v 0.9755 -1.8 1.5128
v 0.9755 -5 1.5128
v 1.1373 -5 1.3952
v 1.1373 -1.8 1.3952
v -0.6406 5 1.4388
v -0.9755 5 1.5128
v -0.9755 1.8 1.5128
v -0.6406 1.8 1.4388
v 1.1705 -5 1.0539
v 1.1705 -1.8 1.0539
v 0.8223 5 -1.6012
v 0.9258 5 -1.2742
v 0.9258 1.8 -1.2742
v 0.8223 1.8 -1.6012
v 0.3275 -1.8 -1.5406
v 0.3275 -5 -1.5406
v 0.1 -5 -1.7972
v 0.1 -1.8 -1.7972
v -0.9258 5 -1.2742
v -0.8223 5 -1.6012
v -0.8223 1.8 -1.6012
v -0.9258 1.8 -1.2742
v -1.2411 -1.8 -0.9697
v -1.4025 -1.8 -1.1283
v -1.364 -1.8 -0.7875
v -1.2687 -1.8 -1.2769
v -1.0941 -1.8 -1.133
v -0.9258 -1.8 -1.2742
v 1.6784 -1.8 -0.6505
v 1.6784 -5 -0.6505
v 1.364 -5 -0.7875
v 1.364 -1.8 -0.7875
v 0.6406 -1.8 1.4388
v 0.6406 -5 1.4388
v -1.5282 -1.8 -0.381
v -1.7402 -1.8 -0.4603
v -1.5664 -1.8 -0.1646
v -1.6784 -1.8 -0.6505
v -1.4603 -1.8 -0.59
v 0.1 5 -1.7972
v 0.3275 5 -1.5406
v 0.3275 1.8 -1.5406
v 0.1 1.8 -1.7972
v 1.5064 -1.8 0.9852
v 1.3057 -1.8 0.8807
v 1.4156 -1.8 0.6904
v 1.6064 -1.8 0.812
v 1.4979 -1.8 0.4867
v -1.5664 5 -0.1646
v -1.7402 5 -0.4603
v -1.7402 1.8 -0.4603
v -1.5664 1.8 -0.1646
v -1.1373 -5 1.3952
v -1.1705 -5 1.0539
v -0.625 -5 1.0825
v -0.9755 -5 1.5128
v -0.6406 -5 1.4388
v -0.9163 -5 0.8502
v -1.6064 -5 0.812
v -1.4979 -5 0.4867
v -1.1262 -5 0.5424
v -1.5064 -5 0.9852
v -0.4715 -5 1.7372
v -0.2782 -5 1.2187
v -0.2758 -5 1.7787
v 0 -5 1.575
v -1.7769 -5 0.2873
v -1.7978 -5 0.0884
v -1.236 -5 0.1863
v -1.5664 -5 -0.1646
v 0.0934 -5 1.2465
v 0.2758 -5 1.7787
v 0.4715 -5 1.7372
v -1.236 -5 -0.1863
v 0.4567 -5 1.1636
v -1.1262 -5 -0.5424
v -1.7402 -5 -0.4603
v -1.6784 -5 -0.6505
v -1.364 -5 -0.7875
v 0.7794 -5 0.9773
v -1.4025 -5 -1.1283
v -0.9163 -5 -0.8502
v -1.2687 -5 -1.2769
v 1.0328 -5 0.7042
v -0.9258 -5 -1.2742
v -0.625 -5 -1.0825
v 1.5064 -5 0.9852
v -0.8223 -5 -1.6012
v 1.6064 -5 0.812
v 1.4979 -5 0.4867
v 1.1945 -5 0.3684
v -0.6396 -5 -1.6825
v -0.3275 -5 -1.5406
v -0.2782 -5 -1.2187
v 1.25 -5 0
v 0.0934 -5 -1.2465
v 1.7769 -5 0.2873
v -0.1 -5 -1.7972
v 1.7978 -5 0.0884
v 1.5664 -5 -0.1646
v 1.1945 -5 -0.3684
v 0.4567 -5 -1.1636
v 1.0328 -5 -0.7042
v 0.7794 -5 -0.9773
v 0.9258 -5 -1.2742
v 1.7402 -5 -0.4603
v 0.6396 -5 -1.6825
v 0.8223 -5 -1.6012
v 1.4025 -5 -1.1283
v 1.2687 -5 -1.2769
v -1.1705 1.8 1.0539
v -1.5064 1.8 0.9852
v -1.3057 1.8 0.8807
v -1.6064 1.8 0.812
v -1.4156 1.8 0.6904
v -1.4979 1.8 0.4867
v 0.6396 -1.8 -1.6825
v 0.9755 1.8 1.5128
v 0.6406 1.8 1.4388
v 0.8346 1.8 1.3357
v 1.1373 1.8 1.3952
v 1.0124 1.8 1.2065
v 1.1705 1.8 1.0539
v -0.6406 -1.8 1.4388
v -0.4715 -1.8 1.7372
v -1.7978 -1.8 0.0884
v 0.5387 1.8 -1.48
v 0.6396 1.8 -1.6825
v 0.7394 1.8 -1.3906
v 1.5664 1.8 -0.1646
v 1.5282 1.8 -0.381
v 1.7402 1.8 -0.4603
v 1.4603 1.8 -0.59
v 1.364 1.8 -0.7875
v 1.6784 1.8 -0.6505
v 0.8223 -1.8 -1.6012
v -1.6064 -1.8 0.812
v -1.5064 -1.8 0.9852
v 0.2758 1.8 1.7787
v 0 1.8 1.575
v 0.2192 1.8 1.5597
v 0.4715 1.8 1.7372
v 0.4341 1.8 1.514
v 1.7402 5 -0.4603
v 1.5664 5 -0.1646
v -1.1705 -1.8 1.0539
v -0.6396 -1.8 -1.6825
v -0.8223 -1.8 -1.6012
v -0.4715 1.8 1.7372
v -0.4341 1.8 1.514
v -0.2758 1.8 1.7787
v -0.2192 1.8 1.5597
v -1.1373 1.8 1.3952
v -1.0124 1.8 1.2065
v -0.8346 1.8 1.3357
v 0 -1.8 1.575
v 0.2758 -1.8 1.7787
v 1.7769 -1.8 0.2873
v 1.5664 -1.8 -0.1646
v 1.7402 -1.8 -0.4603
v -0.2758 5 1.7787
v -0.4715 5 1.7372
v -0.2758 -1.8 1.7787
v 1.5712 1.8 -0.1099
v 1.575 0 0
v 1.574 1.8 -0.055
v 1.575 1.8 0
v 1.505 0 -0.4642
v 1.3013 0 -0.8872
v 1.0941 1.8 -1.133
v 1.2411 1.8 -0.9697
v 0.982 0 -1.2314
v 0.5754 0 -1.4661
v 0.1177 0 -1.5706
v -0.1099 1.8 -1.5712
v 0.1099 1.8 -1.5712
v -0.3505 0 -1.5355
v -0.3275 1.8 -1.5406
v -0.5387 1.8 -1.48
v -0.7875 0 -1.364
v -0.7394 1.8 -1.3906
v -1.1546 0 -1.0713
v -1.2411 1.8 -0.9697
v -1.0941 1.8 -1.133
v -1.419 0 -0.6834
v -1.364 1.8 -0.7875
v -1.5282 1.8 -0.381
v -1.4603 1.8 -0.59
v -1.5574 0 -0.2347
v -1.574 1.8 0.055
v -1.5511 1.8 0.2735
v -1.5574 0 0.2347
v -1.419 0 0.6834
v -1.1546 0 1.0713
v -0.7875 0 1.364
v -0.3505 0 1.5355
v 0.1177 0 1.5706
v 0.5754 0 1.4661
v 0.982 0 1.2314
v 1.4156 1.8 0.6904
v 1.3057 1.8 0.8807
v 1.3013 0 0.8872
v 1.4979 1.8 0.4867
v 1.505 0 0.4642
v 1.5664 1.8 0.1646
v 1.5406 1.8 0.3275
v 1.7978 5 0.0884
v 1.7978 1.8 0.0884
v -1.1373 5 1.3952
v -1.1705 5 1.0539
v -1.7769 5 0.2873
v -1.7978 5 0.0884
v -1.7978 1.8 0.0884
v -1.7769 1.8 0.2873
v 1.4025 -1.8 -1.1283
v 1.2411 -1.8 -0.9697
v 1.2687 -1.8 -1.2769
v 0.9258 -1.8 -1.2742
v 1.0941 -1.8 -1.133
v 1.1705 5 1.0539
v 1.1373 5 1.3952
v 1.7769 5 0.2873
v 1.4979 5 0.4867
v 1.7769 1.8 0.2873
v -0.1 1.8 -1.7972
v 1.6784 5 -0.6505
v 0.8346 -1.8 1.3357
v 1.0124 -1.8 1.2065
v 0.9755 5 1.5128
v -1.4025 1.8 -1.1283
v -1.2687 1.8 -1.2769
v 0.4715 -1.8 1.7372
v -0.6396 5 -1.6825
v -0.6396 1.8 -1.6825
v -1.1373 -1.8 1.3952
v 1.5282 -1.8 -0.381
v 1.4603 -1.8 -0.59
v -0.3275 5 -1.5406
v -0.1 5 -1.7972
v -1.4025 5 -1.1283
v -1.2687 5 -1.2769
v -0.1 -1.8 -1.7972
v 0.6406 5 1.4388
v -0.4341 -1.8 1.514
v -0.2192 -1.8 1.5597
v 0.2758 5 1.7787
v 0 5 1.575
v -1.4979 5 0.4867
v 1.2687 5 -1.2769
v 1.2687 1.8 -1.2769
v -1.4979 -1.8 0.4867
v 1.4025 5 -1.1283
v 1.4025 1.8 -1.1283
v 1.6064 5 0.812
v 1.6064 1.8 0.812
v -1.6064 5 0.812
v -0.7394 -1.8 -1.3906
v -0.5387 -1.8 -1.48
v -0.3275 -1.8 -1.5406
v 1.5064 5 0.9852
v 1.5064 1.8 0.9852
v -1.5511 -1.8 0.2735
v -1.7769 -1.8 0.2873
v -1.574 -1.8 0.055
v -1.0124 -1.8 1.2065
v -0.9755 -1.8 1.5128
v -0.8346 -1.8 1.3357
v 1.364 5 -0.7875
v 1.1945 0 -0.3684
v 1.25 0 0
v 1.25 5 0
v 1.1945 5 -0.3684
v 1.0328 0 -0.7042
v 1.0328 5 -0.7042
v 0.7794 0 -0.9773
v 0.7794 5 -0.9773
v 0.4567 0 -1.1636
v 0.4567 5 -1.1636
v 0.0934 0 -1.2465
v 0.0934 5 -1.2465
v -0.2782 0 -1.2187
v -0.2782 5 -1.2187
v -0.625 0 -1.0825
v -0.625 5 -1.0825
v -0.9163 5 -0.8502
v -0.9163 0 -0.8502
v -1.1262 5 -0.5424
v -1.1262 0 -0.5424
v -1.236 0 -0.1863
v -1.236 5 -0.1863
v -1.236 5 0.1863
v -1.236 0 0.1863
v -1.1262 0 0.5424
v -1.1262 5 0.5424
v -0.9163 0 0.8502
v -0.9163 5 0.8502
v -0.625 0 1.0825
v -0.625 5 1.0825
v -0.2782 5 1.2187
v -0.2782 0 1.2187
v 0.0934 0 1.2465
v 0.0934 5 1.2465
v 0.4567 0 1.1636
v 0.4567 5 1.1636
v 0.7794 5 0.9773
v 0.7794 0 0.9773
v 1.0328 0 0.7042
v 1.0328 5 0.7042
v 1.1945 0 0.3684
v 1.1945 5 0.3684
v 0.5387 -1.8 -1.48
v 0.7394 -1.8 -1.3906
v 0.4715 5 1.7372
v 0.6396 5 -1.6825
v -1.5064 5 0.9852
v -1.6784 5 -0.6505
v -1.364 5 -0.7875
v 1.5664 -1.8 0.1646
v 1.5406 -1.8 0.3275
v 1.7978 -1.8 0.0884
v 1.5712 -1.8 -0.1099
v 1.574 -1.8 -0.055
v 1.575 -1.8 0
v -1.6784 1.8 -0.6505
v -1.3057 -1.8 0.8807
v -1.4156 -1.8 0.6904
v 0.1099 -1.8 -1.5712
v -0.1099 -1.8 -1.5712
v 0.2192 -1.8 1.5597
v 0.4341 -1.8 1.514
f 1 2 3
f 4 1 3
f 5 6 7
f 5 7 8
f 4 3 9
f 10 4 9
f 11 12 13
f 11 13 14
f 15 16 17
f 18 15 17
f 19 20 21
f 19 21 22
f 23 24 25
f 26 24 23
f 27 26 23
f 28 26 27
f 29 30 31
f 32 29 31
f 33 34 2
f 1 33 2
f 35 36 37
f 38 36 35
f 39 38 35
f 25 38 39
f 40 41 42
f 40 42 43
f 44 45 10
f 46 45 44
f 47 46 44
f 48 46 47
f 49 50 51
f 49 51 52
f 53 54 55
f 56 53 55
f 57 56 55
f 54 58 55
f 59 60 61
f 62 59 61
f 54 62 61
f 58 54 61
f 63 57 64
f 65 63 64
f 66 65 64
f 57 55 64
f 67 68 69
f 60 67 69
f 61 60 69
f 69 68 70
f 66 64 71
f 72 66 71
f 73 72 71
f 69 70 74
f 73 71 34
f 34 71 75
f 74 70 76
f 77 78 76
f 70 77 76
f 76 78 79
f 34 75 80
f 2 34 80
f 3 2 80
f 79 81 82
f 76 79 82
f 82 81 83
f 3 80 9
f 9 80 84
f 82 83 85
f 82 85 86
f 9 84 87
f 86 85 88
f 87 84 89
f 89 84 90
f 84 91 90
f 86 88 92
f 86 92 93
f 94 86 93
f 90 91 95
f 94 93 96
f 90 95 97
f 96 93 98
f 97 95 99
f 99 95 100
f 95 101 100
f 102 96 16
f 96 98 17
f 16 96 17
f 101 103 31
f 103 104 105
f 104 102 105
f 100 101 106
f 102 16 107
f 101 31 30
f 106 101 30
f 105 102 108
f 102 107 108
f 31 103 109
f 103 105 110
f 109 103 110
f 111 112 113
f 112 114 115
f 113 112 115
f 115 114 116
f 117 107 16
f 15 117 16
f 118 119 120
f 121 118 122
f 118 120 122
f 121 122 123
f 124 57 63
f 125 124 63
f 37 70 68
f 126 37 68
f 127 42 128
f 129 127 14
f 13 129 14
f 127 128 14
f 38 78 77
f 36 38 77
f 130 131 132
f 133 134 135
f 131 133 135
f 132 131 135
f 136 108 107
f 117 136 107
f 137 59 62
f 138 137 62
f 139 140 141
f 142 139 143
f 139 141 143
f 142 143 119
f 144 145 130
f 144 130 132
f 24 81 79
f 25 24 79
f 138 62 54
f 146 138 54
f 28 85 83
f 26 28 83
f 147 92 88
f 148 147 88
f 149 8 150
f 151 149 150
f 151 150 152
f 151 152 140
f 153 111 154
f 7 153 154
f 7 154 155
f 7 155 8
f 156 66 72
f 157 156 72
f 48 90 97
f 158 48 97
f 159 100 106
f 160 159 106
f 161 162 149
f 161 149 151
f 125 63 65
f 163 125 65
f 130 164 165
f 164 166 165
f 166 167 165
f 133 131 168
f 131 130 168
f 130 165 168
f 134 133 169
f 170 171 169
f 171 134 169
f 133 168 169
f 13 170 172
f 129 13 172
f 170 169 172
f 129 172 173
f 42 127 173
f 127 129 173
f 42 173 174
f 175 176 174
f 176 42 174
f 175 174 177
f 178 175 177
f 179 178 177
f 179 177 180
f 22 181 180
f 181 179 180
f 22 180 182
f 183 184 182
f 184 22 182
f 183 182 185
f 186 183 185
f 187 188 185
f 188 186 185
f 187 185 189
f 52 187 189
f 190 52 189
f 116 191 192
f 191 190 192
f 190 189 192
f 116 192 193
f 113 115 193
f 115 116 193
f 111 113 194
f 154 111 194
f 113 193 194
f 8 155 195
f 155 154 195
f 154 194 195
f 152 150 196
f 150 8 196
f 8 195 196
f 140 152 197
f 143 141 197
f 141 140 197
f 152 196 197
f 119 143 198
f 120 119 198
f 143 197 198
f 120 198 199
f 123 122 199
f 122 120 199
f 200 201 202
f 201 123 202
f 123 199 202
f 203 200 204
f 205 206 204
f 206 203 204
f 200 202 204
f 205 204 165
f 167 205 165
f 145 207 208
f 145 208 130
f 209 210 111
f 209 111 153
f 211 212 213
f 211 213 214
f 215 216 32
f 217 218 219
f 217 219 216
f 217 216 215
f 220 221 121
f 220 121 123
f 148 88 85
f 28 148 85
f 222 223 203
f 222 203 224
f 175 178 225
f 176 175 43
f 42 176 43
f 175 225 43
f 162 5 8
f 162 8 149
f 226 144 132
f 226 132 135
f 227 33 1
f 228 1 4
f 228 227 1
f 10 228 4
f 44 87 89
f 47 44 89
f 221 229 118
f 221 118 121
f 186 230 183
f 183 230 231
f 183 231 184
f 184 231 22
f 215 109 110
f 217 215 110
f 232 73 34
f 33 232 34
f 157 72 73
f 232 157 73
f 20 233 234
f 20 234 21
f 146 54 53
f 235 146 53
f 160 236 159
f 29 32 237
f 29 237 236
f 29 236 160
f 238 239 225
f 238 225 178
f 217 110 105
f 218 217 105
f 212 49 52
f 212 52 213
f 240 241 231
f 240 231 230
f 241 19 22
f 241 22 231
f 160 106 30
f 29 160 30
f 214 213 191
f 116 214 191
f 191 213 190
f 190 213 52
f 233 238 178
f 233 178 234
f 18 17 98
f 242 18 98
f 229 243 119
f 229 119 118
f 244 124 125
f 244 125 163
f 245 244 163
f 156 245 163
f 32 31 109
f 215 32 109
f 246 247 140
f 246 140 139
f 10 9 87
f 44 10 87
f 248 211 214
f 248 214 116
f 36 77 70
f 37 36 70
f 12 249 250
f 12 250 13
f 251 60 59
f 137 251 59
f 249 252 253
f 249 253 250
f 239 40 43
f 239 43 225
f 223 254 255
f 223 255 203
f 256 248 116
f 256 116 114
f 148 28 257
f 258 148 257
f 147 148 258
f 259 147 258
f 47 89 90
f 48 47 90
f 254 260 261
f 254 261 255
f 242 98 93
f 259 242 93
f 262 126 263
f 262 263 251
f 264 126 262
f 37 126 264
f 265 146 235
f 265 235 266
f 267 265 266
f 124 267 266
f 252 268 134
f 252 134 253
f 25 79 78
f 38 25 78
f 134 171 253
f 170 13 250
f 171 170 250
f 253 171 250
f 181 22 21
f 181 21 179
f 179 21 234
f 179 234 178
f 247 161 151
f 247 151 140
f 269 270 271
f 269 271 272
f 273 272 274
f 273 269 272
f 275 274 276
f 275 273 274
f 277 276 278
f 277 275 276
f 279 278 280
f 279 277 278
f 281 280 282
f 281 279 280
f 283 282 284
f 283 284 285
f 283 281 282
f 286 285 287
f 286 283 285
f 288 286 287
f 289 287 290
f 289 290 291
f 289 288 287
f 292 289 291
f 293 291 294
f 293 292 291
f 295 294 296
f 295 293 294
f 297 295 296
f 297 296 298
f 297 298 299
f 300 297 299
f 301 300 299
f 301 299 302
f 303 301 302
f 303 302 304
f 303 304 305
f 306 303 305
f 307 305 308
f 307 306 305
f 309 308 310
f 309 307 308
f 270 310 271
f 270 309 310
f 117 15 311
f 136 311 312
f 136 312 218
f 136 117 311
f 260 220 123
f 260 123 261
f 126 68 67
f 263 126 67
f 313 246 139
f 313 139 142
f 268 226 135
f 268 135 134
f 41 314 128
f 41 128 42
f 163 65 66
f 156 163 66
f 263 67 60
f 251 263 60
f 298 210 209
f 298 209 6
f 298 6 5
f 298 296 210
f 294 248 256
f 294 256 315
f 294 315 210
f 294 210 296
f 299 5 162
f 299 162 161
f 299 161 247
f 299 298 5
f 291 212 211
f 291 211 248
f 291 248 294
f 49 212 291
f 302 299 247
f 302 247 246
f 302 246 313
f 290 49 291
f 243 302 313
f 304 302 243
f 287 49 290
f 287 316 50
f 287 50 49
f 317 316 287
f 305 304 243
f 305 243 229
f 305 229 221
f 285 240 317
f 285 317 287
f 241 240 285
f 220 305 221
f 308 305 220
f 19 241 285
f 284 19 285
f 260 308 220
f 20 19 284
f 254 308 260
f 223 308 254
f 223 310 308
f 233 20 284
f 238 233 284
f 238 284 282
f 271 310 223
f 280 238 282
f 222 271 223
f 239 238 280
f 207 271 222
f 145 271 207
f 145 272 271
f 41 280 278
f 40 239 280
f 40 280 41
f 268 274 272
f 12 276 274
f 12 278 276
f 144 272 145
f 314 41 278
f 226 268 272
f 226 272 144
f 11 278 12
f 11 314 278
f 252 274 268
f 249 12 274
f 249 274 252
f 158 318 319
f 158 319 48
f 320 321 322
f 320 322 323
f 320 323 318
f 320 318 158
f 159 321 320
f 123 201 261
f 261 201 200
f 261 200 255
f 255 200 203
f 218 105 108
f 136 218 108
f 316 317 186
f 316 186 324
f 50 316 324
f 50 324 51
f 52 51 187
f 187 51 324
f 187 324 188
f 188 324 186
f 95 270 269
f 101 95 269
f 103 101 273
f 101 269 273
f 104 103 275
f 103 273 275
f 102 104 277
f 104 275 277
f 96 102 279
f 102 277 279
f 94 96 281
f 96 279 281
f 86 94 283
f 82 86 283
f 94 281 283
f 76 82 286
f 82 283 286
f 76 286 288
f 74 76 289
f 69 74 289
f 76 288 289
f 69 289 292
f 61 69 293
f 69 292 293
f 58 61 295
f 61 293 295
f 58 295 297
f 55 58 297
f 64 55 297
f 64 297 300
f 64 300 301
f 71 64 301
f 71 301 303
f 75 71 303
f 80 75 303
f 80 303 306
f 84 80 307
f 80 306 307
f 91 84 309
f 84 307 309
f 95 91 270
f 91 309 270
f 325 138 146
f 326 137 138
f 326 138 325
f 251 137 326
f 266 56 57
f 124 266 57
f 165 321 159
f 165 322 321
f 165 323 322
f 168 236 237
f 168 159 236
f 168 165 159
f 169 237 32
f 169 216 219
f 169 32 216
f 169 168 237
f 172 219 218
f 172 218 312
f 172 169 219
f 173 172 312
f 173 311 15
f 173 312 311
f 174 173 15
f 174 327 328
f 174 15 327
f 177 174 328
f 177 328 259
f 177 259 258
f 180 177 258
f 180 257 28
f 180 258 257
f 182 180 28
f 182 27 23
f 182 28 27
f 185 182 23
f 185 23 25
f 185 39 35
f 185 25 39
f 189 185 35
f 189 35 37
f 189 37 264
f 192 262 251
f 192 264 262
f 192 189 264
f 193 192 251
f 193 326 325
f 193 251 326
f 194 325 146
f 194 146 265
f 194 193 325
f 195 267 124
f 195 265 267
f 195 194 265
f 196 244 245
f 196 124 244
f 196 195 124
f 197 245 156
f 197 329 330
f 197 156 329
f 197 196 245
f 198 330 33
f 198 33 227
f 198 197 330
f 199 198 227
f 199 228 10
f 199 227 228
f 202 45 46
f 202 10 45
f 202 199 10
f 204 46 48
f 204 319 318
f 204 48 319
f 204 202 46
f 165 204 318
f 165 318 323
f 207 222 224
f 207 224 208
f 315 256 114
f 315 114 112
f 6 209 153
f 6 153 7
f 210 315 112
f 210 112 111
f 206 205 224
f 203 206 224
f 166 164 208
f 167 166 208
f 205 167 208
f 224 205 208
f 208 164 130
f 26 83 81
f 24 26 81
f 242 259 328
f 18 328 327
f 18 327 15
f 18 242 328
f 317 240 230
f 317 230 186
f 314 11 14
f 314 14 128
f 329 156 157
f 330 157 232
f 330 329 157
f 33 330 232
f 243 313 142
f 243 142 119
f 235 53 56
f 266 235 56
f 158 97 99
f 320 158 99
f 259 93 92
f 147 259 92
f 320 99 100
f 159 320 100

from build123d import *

# Parameters (mm, degrees)
SKETCH1_R           = 1.575
SKETCH1_R_2         = 1.25
BOSS_EXTRUDE1_DEPTH = 5
BOSS_EXTRUDE2_DEPTH = 3.2


with BuildPart() as part:
    # Sketch1 → Boss-Extrude1 (new body)
    with BuildSketch(Plane(origin=(0, 0, 0), x_dir=(1, 0, 0), z_dir=(0, 1, 0))):
        Circle(SKETCH1_R)
        Circle(SKETCH1_R_2, mode=Mode.SUBTRACT)
    boss_extrude1 = extrude(amount=BOSS_EXTRUDE1_DEPTH)

    # Sketch2 → Boss-Extrude2 (add)
    with BuildSketch(Plane(origin=(0, 5, 0), x_dir=(1, 0, 0), z_dir=(0, 1, 0))):
        with BuildLine():
            ThreePointArc((-0.925761772, 1.274201766), (-0.640610213, 1.438834096), (-0.327460913, 1.540582471))
            Line((-0.327460913, 1.540582471), (-0.639640715, 1.682515901))
            Line((-0.639640715, 1.682515901), (-0.822349806, 1.601168572))
            Line((-0.822349806, 1.601168572), (-0.925761772, 1.274201766))
        make_face()
        with BuildLine():
            Line((-0.1, 1.797220076), (-0.327460913, 1.540582471))
            ThreePointArc((-0.327460913, 1.540582471), (0, 1.575), (0.327460913, 1.540582471))
            Line((0.327460913, 1.540582471), (0.1, 1.797220076))
            Line((0.1, 1.797220076), (-0.1, 1.797220076))
        make_face()
        with BuildLine():
            Line((0.639640715, 1.682515901), (0.327460913, 1.540582471))
            ThreePointArc((0.327460913, 1.540582471), (0.640610213, 1.438834096), (0.925761772, 1.274201766))
            Line((0.925761772, 1.274201766), (0.822349806, 1.601168572))
            Line((0.822349806, 1.601168572), (0.639640715, 1.682515901))
        make_face()
        with BuildLine():
            ThreePointArc((-1.363990011, 0.7875), (-1.1704531, 1.053880705), (-0.925761772, 1.274201766))
            Line((-0.925761772, 1.274201766), (-1.268681739, 1.276889441))
            Line((-1.268681739, 1.276889441), (-1.40250786, 1.128260476))
            Line((-1.40250786, 1.128260476), (-1.363990011, 0.7875))
        make_face()
        with BuildLine():
            Line((1.268681739, 1.276889441), (0.925761772, 1.274201766))
            ThreePointArc((0.925761772, 1.274201766), (1.1704531, 1.053880705), (1.363990011, 0.7875))
            Line((1.363990011, 0.7875), (1.40250786, 1.128260476))
            Line((1.40250786, 1.128260476), (1.268681739, 1.276889441))
        make_face()
        with BuildLine():
            ThreePointArc((-1.566371985, 0.16463233), (-1.497914013, 0.486701766), (-1.363990011, 0.7875))
            Line((-1.363990011, 0.7875), (-1.678356165, 0.650477198))
            Line((-1.678356165, 0.650477198), (-1.740159564, 0.460265894))
            Line((-1.740159564, 0.460265894), (-1.566371985, 0.16463233))
        make_face()
        with BuildLine():
            Line((1.678356165, 0.650477198), (1.363990011, 0.7875))
            ThreePointArc((1.363990011, 0.7875), (1.497914013, 0.486701766), (1.566371985, 0.16463233))
            Line((1.566371985, 0.16463233), (1.740159564, 0.460265894))
            Line((1.740159564, 0.460265894), (1.678356165, 0.650477198))
        make_face()
        with BuildLine():
            ThreePointArc((-1.497914013, -0.486701766), (-1.566371985, -0.16463233), (-1.566371985, 0.16463233))
            Line((-1.566371985, 0.16463233), (-1.797827562, -0.088408463))
            Line((-1.797827562, -0.088408463), (-1.77692187, -0.287312842))
            Line((-1.77692187, -0.287312842), (-1.497914013, -0.486701766))
        make_face()
        with BuildLine():
            Line((1.797827562, -0.088408463), (1.566371985, 0.16463233))
            ThreePointArc((1.566371985, 0.16463233), (1.566371985, -0.16463233), (1.497914013, -0.486701766))
            Line((1.497914013, -0.486701766), (1.77692187, -0.287312842))
            Line((1.77692187, -0.287312842), (1.797827562, -0.088408463))
        make_face()
        with BuildLine():
            ThreePointArc((-1.1704531, -1.053880705), (-1.363990011, -0.7875), (-1.497914013, -0.486701766))
            Line((-1.497914013, -0.486701766), (-1.606438242, -0.812007497))
            Line((-1.606438242, -0.812007497), (-1.506438242, -0.985212578))
            Line((-1.506438242, -0.985212578), (-1.1704531, -1.053880705))
        make_face()
        with BuildLine():
            ThreePointArc((-0.640610213, -1.438834096), (-0.925761772, -1.274201766), (-1.1704531, -1.053880705))
            Line((-1.1704531, -1.053880705), (-1.137281155, -1.395203059))
            Line((-1.137281155, -1.395203059), (-0.975477756, -1.512760109))
            Line((-0.975477756, -1.512760109), (-0.640610213, -1.438834096))
        make_face()
        with BuildLine():
            Line((1.606438242, -0.812007497), (1.497914013, -0.486701766))
            ThreePointArc((1.497914013, -0.486701766), (1.363990011, -0.7875), (1.1704531, -1.053880705))
            Line((1.1704531, -1.053880705), (1.506438242, -0.985212578))
            Line((1.506438242, -0.985212578), (1.606438242, -0.812007497))
        make_face()
        with BuildLine():
            ThreePointArc((0, -1.575), (-0.327460913, -1.540582471), (-0.640610213, -1.438834096))
            Line((-0.640610213, -1.438834096), (-0.471477825, -1.737155336))
            Line((-0.471477825, -1.737155336), (-0.275848305, -1.778737674))
            Line((-0.275848305, -1.778737674), (0, -1.575))
        make_face()
        with BuildLine():
            Line((1.137281155, -1.395203059), (1.1704531, -1.053880705))
            ThreePointArc((1.1704531, -1.053880705), (0.925761772, -1.274201766), (0.640610213, -1.438834096))
            Line((0.640610213, -1.438834096), (0.975477756, -1.512760109))
            Line((0.975477756, -1.512760109), (1.137281155, -1.395203059))
        make_face()
        with BuildLine():
            ThreePointArc((0.640610213, -1.438834096), (0.327460913, -1.540582471), (0, -1.575))
            Line((0, -1.575), (0.275848305, -1.778737674))
            Line((0.275848305, -1.778737674), (0.471477825, -1.737155336))
            Line((0.471477825, -1.737155336), (0.640610213, -1.438834096))
        make_face()
    boss_extrude2 = extrude(amount=-BOSS_EXTRUDE2_DEPTH)

    # Mirror1: Boss-Extrude1, Boss-Extrude2 across plane
    add(boss_extrude1.mirror(Plane.ZX))
    add(boss_extrude2.mirror(Plane.ZX))


solid = part.part
